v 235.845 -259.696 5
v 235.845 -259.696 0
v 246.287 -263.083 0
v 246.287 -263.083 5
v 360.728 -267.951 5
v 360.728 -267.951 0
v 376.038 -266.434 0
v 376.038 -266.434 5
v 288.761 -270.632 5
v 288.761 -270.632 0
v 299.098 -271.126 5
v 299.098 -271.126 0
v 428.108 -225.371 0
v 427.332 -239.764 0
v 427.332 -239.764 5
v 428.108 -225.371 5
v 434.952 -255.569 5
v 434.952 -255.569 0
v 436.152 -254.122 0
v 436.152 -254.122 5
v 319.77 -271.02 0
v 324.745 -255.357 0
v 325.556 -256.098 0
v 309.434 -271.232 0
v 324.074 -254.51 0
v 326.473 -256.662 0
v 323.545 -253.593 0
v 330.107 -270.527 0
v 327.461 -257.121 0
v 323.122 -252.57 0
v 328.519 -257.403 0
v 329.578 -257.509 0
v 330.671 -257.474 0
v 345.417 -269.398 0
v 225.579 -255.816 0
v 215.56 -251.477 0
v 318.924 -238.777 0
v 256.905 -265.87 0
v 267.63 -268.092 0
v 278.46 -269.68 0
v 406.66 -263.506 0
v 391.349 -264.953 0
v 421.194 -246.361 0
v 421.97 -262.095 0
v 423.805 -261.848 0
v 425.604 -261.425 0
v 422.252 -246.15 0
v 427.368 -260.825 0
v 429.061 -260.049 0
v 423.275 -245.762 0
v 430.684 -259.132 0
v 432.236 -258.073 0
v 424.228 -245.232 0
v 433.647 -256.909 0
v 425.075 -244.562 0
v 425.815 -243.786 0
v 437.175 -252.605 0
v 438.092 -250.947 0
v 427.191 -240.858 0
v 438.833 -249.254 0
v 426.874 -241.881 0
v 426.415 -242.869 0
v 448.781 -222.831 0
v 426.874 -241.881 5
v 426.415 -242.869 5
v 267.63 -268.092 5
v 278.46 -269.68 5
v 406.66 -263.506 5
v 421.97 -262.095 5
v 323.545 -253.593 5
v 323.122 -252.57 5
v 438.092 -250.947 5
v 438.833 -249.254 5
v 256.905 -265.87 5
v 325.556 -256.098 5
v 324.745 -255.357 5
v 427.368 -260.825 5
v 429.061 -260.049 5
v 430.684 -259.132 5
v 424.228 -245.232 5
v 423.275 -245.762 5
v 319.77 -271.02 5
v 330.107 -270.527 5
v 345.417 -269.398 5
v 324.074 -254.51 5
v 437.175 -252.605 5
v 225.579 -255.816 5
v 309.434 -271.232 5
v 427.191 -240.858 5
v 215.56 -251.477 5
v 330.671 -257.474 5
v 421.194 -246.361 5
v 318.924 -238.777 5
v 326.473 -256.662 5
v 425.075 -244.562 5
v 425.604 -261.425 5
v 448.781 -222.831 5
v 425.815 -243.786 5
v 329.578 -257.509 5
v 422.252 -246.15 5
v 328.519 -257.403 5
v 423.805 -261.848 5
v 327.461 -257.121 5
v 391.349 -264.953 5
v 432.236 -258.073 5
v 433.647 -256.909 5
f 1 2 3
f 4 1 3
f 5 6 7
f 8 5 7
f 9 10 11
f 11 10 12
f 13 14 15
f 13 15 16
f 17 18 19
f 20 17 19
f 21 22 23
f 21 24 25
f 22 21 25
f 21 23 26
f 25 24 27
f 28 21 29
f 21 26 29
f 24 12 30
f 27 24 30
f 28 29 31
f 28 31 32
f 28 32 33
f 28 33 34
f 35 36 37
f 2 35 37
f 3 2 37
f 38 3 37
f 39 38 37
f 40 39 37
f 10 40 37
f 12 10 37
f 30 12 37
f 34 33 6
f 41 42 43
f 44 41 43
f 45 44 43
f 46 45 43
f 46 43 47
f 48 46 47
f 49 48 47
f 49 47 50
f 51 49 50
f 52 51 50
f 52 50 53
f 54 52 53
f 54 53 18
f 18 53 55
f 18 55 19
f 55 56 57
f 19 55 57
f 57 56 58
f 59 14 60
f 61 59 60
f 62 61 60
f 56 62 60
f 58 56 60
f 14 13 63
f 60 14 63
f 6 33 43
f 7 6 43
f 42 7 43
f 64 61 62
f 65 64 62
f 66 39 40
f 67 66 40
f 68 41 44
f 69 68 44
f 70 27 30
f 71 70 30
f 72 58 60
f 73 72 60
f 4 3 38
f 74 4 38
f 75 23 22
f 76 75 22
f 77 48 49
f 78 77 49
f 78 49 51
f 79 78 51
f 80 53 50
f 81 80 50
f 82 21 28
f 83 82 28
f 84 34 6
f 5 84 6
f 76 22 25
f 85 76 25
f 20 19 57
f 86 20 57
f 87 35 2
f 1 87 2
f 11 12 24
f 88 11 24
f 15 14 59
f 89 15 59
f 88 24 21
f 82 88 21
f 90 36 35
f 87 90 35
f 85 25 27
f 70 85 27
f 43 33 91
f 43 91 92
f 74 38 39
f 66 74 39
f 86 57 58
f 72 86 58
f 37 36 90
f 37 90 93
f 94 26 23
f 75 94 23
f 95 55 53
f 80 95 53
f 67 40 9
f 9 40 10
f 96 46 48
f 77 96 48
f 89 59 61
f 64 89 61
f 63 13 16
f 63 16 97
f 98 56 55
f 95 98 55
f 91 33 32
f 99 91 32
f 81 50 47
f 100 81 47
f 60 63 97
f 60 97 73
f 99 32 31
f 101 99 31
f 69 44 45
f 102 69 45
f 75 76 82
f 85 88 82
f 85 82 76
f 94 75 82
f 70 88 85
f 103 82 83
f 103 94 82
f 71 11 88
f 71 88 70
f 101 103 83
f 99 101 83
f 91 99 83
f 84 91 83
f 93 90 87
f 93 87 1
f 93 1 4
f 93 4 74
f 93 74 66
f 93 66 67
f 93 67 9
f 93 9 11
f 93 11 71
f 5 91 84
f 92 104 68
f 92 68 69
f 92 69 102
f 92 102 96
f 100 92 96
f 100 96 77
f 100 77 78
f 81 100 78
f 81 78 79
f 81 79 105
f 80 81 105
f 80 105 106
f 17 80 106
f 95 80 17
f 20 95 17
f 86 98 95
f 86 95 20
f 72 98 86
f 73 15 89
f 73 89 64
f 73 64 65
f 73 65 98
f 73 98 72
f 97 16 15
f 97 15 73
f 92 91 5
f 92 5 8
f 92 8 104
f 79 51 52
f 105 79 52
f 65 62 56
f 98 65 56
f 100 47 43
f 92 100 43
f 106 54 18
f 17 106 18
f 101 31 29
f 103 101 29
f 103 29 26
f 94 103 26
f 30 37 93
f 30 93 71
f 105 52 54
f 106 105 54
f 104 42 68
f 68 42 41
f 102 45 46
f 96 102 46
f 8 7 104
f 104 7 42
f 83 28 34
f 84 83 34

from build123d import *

# Parameters (mm, degrees)
PAD005_DEPTH = 5


with BuildPart() as part:
    # Sketch005 → Pad005 (new body)
    with BuildSketch(Plane.XY):
        with BuildLine():
            add(Edge.make_bspline(
                [(427.332322, -239.764326), (427.191211, -240.857937)],
                knots=[0, 0, 3.1257, 3.1257], degree=1))
            add(Edge.make_bspline(
                [(427.191211, -240.857937), (426.873711, -241.880992)],
                knots=[0, 0, 3.036445, 3.036445], degree=1))
            add(Edge.make_bspline(
                [(426.873711, -241.880992), (426.4151, -242.86877)],
                knots=[0, 0, 3.08707, 3.08707], degree=1))
            add(Edge.make_bspline(
                [(426.4151, -242.86877), (425.815377, -243.785992)],
                knots=[0, 0, 3.106445, 3.106445], degree=1))
            add(Edge.make_bspline(
                [(425.815377, -243.785992), (425.074544, -244.562104)],
                knots=[0, 0, 3.041381, 3.041381], degree=1))
            add(Edge.make_bspline(
                [(425.074544, -244.562104), (424.227877, -245.232381)],
                knots=[0, 0, 3.061046, 3.061046], degree=1))
            add(Edge.make_bspline(
                [(424.227877, -245.232381), (423.275377, -245.761548)],
                knots=[0, 0, 3.088689, 3.088689], degree=1))
            add(Edge.make_bspline(
                [(423.275377, -245.761548), (422.252322, -246.149604)],
                knots=[0, 0, 3.101612, 3.101612], degree=1))
            add(Edge.make_bspline(
                [(422.252322, -246.149604), (421.193989, -246.36127)],
                knots=[0, 0, 3.059412, 3.059412], degree=1))
            add(Edge.make_bspline(
                [(330.671213, -257.47377), (421.193989, -246.36127)],
                knots=[0, 0, 258.526227, 258.526227], degree=1))
            add(Edge.make_bspline(
                [(330.671213, -257.47377), (329.577602, -257.509048)],
                knots=[0, 0, 3.101612, 3.101612], degree=1))
            add(Edge.make_bspline(
                [(329.577602, -257.509048), (328.519268, -257.403214)],
                knots=[0, 0, 3.014963, 3.014963], degree=1))
            add(Edge.make_bspline(
                [(328.519268, -257.403214), (327.460935, -257.120992)],
                knots=[0, 0, 3.104835, 3.104835], degree=1))
            add(Edge.make_bspline(
                [(327.460935, -257.120992), (326.473157, -256.662381)],
                knots=[0, 0, 3.08707, 3.08707], degree=1))
            add(Edge.make_bspline(
                [(326.473157, -256.662381), (325.555935, -256.097937)],
                knots=[0, 0, 3.052868, 3.052868], degree=1))
            add(Edge.make_bspline(
                [(325.555935, -256.097937), (324.744546, -255.357103)],
                knots=[0, 0, 3.114482, 3.114482], degree=1))
            add(Edge.make_bspline(
                [(324.744546, -255.357103), (324.074268, -254.510437)],
                knots=[0, 0, 3.061046, 3.061046], degree=1))
            add(Edge.make_bspline(
                [(324.074268, -254.510437), (323.545102, -253.593214)],
                knots=[0, 0, 3.001666, 3.001666], degree=1))
            add(Edge.make_bspline(
                [(323.545102, -253.593214), (323.121768, -252.570159)],
                knots=[0, 0, 3.138471, 3.138471], degree=1))
            add(Edge.make_bspline(
                [(318.923713, -238.776548), (323.121768, -252.570159)],
                knots=[0, 0, 40.870772, 40.870772], degree=1))
            add(Edge.make_bspline(
                [(215.559826, -251.476548), (318.923713, -238.776548)],
                knots=[0, 0, 295.20332, 295.20332], degree=1))
            add(Edge.make_bspline(
                [(215.559826, -251.476548), (225.578715, -255.815714)],
                knots=[0, 0, 30.949152, 30.949152], degree=1))
            add(Edge.make_bspline(
                [(225.578715, -255.815714), (235.844548, -259.69627)],
                knots=[0, 0, 31.109645, 31.109645], degree=1))
            add(Edge.make_bspline(
                [(235.844548, -259.69627), (246.28677, -263.082936)],
                knots=[0, 0, 31.117841, 31.117841], degree=1))
            add(Edge.make_bspline(
                [(246.28677, -263.082936), (256.905381, -265.869881)],
                knots=[0, 0, 31.119447, 31.119447], degree=1))
            add(Edge.make_bspline(
                [(256.905381, -265.869881), (267.629825, -268.092381)],
                knots=[0, 0, 31.045934, 31.045934], degree=1))
            add(Edge.make_bspline(
                [(267.629825, -268.092381), (278.460103, -269.679881)],
                knots=[0, 0, 31.028052, 31.028052], degree=1))
            add(Edge.make_bspline(
                [(278.460103, -269.679881), (288.761214, -270.632381)],
                knots=[0, 0, 29.324563, 29.324563], degree=1))
            add(Edge.make_bspline(
                [(288.761214, -270.632381), (299.097602, -271.12627)],
                knots=[0, 0, 29.333428, 29.333428], degree=1))
            add(Edge.make_bspline(
                [(299.097602, -271.12627), (309.433991, -271.232103)],
                knots=[0, 0, 29.301536, 29.301536], degree=1))
            add(Edge.make_bspline(
                [(309.433991, -271.232103), (319.77038, -271.020436)],
                knots=[0, 0, 29.306143, 29.306143], degree=1))
            add(Edge.make_bspline(
                [(319.77038, -271.020436), (330.106768, -270.526547)],
                knots=[0, 0, 29.333428, 29.333428], degree=1))
            add(Edge.make_bspline(
                [(330.106768, -270.526547), (345.417324, -269.397659)],
                knots=[0, 0, 43.517812, 43.517812], degree=1))
            add(Edge.make_bspline(
                [(345.417324, -269.397659), (360.727879, -267.95127)],
                knots=[0, 0, 43.593233, 43.593233], degree=1))
            add(Edge.make_bspline(
                [(360.727879, -267.95127), (376.038434, -266.434325)],
                knots=[0, 0, 43.612498, 43.612498], degree=1))
            add(Edge.make_bspline(
                [(376.038434, -266.434325), (391.348989, -264.952659)],
                knots=[0, 0, 43.602752, 43.602752], degree=1))
            add(Edge.make_bspline(
                [(391.348989, -264.952659), (406.659544, -263.50627)],
                knots=[0, 0, 43.593233, 43.593233], degree=1))
            add(Edge.make_bspline(
                [(406.659544, -263.50627), (421.9701, -262.095159)],
                knots=[0, 0, 43.583942, 43.583942], degree=1))
            add(Edge.make_bspline(
                [(421.9701, -262.095159), (423.804544, -261.848214)],
                knots=[0, 0, 5.246904, 5.246904], degree=1))
            add(Edge.make_bspline(
                [(423.804544, -261.848214), (425.603711, -261.424881)],
                knots=[0, 0, 5.239275, 5.239275], degree=1))
            add(Edge.make_bspline(
                [(425.603711, -261.424881), (427.3676, -260.825159)],
                knots=[0, 0, 5.281098, 5.281098], degree=1))
            add(Edge.make_bspline(
                [(427.3676, -260.825159), (429.060933, -260.049048)],
                knots=[0, 0, 5.280152, 5.280152], degree=1))
            add(Edge.make_bspline(
                [(429.060933, -260.049048), (430.683711, -259.131825)],
                knots=[0, 0, 5.283938, 5.283938], degree=1))
            add(Edge.make_bspline(
                [(430.683711, -259.131825), (432.235933, -258.073492)],
                knots=[0, 0, 5.325411, 5.325411], degree=1))
            add(Edge.make_bspline(
                [(432.235933, -258.073492), (433.647044, -256.909325)],
                knots=[0, 0, 5.185557, 5.185557], degree=1))
            add(Edge.make_bspline(
                [(433.647044, -256.909325), (434.952322, -255.56877)],
                knots=[0, 0, 5.303772, 5.303772], degree=1))
            add(Edge.make_bspline(
                [(434.952322, -255.56877), (436.151766, -254.122381)],
                knots=[0, 0, 5.32635, 5.32635], degree=1))
            add(Edge.make_bspline(
                [(436.151766, -254.122381), (437.174822, -252.605437)],
                knots=[0, 0, 5.186521, 5.186521], degree=1))
            add(Edge.make_bspline(
                [(437.174822, -252.605437), (438.092044, -250.947381)],
                knots=[0, 0, 5.37122, 5.37122], degree=1))
            add(Edge.make_bspline(
                [(438.092044, -250.947381), (438.832877, -249.254048)],
                knots=[0, 0, 5.239275, 5.239275], degree=1))
            add(Edge.make_bspline(
                [(448.78121, -222.830993), (438.832877, -249.254048)],
                knots=[0, 0, 80.032806, 80.032806], degree=1))
            add(Edge.make_bspline(
                [(428.108433, -225.370993), (448.78121, -222.830993)],
                knots=[0, 0, 59.040664, 59.040664], degree=1))
            add(Edge.make_bspline(
                [(427.332322, -239.764326), (428.108433, -225.370993)],
                knots=[0, 0, 40.859271, 40.859271], degree=1))
        make_face()
    extrude(amount=PAD005_DEPTH)


solid = part.part
